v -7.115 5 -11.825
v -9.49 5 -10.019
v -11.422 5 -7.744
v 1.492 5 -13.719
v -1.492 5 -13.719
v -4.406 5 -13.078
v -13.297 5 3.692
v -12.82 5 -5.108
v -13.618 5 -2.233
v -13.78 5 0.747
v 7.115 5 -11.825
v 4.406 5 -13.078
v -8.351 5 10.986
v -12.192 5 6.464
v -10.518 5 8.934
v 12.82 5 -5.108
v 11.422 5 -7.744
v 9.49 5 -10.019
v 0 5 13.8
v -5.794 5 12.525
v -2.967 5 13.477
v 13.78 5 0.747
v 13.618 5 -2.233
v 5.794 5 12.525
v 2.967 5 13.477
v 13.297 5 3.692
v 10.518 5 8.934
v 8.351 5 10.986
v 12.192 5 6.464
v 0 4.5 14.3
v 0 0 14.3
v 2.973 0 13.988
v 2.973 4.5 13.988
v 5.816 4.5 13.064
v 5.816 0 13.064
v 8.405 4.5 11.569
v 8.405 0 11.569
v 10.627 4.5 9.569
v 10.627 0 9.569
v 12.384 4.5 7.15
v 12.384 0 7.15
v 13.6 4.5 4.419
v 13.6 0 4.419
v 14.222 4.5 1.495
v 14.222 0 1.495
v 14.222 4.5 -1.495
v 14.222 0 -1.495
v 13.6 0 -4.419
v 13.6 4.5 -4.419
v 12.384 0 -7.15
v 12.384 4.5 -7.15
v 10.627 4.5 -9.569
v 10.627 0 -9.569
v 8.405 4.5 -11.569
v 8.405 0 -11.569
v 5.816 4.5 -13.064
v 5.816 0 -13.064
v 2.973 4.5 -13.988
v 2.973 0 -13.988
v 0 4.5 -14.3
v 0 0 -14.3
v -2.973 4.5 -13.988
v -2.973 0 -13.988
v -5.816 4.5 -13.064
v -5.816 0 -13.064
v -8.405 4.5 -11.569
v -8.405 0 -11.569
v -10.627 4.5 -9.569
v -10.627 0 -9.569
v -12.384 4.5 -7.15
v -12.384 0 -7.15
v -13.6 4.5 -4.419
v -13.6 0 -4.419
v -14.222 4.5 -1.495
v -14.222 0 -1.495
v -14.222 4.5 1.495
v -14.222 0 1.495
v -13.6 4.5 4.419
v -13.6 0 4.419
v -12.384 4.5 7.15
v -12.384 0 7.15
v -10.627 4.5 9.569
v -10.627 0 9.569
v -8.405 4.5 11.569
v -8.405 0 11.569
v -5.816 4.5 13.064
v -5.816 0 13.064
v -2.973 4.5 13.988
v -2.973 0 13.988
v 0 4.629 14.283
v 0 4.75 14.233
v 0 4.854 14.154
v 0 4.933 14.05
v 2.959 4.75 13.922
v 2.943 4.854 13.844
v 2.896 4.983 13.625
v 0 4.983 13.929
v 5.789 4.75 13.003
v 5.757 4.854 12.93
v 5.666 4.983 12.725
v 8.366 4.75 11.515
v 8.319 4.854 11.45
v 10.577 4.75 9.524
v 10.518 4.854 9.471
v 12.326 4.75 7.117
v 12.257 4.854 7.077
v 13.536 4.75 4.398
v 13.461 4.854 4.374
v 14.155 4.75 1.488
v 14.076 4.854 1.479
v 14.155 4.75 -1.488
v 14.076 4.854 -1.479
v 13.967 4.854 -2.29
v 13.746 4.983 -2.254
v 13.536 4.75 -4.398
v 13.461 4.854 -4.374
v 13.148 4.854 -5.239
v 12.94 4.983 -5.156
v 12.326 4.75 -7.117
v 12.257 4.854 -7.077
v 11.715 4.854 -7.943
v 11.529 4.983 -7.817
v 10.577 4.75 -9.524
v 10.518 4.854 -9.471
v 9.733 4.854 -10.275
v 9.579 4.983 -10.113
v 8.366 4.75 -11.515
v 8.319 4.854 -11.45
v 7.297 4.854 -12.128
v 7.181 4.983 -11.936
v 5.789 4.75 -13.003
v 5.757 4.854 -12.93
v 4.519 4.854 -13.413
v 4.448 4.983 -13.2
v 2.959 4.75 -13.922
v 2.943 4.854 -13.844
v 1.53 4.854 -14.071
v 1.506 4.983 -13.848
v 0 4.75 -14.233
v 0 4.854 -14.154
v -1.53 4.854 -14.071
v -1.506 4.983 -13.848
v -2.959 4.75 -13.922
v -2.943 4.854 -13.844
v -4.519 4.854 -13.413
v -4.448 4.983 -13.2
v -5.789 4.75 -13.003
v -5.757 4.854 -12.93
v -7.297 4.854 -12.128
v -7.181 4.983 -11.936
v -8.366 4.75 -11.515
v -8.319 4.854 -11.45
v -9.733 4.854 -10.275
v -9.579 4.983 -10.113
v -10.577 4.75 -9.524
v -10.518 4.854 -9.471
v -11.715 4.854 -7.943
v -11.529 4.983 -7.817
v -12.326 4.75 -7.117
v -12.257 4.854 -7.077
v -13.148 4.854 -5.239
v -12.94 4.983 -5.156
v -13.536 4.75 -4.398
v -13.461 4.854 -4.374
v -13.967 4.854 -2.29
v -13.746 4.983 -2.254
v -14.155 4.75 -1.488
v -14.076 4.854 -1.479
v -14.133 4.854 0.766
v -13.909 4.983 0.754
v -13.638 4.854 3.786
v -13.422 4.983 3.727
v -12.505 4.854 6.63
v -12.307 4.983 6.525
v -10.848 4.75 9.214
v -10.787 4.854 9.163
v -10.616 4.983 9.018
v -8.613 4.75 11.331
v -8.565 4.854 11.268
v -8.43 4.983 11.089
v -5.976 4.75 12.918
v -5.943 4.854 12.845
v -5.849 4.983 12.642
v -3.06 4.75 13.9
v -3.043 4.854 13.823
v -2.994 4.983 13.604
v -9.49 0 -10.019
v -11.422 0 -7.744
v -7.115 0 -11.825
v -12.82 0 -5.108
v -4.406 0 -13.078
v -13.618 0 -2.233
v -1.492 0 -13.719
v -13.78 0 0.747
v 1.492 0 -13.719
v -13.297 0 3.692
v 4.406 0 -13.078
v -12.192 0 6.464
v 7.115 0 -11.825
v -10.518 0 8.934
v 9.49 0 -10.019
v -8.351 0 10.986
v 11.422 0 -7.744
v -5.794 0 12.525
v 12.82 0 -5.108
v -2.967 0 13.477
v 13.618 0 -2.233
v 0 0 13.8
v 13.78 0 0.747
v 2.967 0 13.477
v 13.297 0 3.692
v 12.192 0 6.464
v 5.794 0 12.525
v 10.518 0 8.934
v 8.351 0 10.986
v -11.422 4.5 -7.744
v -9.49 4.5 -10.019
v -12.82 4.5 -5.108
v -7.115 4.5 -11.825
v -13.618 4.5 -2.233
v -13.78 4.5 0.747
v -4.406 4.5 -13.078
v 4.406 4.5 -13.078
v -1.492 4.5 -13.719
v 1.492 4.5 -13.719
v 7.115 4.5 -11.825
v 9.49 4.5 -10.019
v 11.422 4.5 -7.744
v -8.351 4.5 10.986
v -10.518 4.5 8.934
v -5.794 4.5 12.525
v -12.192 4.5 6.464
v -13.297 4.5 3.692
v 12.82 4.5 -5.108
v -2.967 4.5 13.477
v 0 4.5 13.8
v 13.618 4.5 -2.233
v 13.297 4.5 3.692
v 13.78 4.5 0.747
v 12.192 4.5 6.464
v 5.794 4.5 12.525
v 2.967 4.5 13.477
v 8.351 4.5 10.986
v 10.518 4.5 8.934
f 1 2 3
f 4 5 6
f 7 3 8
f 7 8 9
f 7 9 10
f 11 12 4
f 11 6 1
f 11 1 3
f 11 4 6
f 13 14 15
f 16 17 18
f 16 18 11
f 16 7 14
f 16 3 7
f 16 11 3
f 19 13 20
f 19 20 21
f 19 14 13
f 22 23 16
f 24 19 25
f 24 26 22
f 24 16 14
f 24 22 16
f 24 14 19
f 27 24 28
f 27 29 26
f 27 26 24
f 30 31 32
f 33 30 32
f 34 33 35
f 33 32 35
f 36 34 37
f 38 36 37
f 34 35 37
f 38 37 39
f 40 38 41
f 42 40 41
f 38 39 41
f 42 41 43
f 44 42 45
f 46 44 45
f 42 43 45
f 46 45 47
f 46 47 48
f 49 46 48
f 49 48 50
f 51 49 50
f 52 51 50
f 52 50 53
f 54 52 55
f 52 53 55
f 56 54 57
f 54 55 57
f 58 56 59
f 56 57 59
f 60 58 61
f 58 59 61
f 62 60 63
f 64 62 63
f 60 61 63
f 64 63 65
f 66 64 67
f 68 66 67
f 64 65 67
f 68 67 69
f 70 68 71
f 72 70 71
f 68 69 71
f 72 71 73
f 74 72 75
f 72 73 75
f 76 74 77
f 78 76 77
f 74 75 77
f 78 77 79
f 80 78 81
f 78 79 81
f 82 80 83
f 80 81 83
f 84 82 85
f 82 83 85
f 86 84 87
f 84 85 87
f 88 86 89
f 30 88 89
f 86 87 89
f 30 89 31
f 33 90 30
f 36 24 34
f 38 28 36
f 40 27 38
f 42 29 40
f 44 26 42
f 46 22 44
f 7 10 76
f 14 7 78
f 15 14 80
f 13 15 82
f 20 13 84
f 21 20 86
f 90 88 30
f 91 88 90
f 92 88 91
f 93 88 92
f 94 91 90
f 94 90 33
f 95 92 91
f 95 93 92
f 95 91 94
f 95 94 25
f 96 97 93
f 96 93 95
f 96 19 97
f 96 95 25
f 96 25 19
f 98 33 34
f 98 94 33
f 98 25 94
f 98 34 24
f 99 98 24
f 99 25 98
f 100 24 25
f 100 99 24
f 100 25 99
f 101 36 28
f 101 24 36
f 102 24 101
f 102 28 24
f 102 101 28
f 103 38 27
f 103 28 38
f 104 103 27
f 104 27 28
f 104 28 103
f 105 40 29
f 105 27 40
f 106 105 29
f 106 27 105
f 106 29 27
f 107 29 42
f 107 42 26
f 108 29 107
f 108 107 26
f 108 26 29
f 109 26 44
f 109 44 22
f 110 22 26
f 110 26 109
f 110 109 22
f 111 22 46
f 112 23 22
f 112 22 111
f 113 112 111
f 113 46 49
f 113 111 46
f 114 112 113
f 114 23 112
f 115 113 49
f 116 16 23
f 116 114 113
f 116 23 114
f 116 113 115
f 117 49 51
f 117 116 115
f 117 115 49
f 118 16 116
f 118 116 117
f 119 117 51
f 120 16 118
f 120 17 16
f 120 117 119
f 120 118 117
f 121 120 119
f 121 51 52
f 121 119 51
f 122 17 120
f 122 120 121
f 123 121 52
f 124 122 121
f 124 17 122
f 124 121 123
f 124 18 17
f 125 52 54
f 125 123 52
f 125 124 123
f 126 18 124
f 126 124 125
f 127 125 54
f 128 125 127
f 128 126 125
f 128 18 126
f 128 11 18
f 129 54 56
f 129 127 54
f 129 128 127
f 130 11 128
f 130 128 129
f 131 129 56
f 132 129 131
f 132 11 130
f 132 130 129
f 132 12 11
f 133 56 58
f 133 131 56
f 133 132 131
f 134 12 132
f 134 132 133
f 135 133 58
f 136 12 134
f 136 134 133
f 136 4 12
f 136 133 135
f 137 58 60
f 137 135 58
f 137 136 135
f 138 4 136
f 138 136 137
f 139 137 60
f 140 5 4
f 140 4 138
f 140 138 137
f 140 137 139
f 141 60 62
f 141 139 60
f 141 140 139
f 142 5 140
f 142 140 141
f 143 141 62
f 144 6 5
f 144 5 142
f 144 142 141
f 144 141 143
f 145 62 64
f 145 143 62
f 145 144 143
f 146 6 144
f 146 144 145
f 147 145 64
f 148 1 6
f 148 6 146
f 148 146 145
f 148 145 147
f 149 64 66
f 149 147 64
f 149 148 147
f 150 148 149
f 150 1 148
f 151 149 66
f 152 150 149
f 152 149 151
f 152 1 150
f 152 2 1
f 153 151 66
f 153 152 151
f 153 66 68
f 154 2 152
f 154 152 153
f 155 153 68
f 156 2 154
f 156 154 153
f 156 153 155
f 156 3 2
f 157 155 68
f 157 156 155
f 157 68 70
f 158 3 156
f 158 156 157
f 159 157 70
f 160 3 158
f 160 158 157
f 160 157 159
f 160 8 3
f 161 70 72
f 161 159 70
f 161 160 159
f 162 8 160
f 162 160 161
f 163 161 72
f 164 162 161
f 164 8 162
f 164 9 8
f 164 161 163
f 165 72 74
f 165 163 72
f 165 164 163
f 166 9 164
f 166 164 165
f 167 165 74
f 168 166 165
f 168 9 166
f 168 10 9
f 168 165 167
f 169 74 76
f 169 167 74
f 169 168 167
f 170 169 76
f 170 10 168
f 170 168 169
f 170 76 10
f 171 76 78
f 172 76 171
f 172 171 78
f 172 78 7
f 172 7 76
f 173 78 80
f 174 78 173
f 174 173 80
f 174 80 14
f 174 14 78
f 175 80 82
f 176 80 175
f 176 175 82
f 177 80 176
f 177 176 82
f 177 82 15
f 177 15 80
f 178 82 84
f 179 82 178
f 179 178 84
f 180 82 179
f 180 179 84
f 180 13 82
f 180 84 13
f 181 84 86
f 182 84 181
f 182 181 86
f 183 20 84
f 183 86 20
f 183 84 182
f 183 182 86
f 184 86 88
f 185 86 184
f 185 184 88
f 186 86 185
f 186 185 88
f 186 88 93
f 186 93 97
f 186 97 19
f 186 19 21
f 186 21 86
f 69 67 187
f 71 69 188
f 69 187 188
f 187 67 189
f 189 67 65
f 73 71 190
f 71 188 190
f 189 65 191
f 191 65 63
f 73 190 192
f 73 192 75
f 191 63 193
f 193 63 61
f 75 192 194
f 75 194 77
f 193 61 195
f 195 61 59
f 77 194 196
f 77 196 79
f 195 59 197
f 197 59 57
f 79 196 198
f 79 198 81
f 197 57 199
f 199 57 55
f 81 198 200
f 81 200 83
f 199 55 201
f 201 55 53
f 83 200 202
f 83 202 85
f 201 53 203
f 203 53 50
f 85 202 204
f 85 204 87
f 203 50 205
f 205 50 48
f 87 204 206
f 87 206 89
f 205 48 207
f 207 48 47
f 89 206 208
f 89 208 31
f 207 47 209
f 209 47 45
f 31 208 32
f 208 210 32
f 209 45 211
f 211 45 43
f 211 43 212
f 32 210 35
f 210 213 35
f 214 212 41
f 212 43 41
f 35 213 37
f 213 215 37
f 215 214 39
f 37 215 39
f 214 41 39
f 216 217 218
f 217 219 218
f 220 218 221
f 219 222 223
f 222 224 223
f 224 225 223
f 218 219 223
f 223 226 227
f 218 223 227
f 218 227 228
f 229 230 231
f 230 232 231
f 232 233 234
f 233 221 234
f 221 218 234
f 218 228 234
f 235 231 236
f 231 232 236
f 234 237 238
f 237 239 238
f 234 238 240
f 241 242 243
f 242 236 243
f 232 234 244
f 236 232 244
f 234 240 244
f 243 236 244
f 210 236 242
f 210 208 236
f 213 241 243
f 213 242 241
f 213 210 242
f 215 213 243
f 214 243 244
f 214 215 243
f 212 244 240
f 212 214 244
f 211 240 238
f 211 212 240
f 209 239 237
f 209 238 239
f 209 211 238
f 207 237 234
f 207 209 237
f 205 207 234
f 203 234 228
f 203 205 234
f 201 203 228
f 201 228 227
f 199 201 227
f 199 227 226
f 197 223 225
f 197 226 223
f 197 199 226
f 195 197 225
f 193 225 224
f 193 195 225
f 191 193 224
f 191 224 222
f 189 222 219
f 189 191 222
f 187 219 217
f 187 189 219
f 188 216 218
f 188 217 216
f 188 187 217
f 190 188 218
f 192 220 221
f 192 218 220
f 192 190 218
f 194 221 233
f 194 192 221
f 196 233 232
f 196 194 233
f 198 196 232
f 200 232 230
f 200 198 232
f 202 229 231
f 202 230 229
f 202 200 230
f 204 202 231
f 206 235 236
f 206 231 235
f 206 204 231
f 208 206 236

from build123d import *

# Parameters (mm, degrees)
ESQUISSE1_R        = 14.3
BOSS_EXTRU_1_DEPTH = 5
COQUE1_T           = -0.5
CONG_1_R           = 0.5


with BuildPart() as part:
    # Esquisse1 → Boss.-Extru.1 (new body)
    with BuildSketch(Plane(origin=(0, 0, 0), x_dir=(1, 0, 0), z_dir=(0, 1, 0))):
        with Locations(Location((0, 0, 0), (0, 0, 270))):
            Circle(ESQUISSE1_R)
    extrude(amount=BOSS_EXTRU_1_DEPTH)

    # Coque1
    coque1_openings = [part.faces().sort_by_distance(p)[0] for p in [
        (0, 0, 0),
    ]]
    offset(amount=COQUE1_T, openings=coque1_openings, kind=Kind.INTERSECTION)

    # Congé1
    cong_1_edges = [part.edges().sort_by_distance(p)[0] for p in [
        (0, 5, -14.3),
    ]]
    fillet(cong_1_edges, radius=CONG_1_R)


solid = part.part
